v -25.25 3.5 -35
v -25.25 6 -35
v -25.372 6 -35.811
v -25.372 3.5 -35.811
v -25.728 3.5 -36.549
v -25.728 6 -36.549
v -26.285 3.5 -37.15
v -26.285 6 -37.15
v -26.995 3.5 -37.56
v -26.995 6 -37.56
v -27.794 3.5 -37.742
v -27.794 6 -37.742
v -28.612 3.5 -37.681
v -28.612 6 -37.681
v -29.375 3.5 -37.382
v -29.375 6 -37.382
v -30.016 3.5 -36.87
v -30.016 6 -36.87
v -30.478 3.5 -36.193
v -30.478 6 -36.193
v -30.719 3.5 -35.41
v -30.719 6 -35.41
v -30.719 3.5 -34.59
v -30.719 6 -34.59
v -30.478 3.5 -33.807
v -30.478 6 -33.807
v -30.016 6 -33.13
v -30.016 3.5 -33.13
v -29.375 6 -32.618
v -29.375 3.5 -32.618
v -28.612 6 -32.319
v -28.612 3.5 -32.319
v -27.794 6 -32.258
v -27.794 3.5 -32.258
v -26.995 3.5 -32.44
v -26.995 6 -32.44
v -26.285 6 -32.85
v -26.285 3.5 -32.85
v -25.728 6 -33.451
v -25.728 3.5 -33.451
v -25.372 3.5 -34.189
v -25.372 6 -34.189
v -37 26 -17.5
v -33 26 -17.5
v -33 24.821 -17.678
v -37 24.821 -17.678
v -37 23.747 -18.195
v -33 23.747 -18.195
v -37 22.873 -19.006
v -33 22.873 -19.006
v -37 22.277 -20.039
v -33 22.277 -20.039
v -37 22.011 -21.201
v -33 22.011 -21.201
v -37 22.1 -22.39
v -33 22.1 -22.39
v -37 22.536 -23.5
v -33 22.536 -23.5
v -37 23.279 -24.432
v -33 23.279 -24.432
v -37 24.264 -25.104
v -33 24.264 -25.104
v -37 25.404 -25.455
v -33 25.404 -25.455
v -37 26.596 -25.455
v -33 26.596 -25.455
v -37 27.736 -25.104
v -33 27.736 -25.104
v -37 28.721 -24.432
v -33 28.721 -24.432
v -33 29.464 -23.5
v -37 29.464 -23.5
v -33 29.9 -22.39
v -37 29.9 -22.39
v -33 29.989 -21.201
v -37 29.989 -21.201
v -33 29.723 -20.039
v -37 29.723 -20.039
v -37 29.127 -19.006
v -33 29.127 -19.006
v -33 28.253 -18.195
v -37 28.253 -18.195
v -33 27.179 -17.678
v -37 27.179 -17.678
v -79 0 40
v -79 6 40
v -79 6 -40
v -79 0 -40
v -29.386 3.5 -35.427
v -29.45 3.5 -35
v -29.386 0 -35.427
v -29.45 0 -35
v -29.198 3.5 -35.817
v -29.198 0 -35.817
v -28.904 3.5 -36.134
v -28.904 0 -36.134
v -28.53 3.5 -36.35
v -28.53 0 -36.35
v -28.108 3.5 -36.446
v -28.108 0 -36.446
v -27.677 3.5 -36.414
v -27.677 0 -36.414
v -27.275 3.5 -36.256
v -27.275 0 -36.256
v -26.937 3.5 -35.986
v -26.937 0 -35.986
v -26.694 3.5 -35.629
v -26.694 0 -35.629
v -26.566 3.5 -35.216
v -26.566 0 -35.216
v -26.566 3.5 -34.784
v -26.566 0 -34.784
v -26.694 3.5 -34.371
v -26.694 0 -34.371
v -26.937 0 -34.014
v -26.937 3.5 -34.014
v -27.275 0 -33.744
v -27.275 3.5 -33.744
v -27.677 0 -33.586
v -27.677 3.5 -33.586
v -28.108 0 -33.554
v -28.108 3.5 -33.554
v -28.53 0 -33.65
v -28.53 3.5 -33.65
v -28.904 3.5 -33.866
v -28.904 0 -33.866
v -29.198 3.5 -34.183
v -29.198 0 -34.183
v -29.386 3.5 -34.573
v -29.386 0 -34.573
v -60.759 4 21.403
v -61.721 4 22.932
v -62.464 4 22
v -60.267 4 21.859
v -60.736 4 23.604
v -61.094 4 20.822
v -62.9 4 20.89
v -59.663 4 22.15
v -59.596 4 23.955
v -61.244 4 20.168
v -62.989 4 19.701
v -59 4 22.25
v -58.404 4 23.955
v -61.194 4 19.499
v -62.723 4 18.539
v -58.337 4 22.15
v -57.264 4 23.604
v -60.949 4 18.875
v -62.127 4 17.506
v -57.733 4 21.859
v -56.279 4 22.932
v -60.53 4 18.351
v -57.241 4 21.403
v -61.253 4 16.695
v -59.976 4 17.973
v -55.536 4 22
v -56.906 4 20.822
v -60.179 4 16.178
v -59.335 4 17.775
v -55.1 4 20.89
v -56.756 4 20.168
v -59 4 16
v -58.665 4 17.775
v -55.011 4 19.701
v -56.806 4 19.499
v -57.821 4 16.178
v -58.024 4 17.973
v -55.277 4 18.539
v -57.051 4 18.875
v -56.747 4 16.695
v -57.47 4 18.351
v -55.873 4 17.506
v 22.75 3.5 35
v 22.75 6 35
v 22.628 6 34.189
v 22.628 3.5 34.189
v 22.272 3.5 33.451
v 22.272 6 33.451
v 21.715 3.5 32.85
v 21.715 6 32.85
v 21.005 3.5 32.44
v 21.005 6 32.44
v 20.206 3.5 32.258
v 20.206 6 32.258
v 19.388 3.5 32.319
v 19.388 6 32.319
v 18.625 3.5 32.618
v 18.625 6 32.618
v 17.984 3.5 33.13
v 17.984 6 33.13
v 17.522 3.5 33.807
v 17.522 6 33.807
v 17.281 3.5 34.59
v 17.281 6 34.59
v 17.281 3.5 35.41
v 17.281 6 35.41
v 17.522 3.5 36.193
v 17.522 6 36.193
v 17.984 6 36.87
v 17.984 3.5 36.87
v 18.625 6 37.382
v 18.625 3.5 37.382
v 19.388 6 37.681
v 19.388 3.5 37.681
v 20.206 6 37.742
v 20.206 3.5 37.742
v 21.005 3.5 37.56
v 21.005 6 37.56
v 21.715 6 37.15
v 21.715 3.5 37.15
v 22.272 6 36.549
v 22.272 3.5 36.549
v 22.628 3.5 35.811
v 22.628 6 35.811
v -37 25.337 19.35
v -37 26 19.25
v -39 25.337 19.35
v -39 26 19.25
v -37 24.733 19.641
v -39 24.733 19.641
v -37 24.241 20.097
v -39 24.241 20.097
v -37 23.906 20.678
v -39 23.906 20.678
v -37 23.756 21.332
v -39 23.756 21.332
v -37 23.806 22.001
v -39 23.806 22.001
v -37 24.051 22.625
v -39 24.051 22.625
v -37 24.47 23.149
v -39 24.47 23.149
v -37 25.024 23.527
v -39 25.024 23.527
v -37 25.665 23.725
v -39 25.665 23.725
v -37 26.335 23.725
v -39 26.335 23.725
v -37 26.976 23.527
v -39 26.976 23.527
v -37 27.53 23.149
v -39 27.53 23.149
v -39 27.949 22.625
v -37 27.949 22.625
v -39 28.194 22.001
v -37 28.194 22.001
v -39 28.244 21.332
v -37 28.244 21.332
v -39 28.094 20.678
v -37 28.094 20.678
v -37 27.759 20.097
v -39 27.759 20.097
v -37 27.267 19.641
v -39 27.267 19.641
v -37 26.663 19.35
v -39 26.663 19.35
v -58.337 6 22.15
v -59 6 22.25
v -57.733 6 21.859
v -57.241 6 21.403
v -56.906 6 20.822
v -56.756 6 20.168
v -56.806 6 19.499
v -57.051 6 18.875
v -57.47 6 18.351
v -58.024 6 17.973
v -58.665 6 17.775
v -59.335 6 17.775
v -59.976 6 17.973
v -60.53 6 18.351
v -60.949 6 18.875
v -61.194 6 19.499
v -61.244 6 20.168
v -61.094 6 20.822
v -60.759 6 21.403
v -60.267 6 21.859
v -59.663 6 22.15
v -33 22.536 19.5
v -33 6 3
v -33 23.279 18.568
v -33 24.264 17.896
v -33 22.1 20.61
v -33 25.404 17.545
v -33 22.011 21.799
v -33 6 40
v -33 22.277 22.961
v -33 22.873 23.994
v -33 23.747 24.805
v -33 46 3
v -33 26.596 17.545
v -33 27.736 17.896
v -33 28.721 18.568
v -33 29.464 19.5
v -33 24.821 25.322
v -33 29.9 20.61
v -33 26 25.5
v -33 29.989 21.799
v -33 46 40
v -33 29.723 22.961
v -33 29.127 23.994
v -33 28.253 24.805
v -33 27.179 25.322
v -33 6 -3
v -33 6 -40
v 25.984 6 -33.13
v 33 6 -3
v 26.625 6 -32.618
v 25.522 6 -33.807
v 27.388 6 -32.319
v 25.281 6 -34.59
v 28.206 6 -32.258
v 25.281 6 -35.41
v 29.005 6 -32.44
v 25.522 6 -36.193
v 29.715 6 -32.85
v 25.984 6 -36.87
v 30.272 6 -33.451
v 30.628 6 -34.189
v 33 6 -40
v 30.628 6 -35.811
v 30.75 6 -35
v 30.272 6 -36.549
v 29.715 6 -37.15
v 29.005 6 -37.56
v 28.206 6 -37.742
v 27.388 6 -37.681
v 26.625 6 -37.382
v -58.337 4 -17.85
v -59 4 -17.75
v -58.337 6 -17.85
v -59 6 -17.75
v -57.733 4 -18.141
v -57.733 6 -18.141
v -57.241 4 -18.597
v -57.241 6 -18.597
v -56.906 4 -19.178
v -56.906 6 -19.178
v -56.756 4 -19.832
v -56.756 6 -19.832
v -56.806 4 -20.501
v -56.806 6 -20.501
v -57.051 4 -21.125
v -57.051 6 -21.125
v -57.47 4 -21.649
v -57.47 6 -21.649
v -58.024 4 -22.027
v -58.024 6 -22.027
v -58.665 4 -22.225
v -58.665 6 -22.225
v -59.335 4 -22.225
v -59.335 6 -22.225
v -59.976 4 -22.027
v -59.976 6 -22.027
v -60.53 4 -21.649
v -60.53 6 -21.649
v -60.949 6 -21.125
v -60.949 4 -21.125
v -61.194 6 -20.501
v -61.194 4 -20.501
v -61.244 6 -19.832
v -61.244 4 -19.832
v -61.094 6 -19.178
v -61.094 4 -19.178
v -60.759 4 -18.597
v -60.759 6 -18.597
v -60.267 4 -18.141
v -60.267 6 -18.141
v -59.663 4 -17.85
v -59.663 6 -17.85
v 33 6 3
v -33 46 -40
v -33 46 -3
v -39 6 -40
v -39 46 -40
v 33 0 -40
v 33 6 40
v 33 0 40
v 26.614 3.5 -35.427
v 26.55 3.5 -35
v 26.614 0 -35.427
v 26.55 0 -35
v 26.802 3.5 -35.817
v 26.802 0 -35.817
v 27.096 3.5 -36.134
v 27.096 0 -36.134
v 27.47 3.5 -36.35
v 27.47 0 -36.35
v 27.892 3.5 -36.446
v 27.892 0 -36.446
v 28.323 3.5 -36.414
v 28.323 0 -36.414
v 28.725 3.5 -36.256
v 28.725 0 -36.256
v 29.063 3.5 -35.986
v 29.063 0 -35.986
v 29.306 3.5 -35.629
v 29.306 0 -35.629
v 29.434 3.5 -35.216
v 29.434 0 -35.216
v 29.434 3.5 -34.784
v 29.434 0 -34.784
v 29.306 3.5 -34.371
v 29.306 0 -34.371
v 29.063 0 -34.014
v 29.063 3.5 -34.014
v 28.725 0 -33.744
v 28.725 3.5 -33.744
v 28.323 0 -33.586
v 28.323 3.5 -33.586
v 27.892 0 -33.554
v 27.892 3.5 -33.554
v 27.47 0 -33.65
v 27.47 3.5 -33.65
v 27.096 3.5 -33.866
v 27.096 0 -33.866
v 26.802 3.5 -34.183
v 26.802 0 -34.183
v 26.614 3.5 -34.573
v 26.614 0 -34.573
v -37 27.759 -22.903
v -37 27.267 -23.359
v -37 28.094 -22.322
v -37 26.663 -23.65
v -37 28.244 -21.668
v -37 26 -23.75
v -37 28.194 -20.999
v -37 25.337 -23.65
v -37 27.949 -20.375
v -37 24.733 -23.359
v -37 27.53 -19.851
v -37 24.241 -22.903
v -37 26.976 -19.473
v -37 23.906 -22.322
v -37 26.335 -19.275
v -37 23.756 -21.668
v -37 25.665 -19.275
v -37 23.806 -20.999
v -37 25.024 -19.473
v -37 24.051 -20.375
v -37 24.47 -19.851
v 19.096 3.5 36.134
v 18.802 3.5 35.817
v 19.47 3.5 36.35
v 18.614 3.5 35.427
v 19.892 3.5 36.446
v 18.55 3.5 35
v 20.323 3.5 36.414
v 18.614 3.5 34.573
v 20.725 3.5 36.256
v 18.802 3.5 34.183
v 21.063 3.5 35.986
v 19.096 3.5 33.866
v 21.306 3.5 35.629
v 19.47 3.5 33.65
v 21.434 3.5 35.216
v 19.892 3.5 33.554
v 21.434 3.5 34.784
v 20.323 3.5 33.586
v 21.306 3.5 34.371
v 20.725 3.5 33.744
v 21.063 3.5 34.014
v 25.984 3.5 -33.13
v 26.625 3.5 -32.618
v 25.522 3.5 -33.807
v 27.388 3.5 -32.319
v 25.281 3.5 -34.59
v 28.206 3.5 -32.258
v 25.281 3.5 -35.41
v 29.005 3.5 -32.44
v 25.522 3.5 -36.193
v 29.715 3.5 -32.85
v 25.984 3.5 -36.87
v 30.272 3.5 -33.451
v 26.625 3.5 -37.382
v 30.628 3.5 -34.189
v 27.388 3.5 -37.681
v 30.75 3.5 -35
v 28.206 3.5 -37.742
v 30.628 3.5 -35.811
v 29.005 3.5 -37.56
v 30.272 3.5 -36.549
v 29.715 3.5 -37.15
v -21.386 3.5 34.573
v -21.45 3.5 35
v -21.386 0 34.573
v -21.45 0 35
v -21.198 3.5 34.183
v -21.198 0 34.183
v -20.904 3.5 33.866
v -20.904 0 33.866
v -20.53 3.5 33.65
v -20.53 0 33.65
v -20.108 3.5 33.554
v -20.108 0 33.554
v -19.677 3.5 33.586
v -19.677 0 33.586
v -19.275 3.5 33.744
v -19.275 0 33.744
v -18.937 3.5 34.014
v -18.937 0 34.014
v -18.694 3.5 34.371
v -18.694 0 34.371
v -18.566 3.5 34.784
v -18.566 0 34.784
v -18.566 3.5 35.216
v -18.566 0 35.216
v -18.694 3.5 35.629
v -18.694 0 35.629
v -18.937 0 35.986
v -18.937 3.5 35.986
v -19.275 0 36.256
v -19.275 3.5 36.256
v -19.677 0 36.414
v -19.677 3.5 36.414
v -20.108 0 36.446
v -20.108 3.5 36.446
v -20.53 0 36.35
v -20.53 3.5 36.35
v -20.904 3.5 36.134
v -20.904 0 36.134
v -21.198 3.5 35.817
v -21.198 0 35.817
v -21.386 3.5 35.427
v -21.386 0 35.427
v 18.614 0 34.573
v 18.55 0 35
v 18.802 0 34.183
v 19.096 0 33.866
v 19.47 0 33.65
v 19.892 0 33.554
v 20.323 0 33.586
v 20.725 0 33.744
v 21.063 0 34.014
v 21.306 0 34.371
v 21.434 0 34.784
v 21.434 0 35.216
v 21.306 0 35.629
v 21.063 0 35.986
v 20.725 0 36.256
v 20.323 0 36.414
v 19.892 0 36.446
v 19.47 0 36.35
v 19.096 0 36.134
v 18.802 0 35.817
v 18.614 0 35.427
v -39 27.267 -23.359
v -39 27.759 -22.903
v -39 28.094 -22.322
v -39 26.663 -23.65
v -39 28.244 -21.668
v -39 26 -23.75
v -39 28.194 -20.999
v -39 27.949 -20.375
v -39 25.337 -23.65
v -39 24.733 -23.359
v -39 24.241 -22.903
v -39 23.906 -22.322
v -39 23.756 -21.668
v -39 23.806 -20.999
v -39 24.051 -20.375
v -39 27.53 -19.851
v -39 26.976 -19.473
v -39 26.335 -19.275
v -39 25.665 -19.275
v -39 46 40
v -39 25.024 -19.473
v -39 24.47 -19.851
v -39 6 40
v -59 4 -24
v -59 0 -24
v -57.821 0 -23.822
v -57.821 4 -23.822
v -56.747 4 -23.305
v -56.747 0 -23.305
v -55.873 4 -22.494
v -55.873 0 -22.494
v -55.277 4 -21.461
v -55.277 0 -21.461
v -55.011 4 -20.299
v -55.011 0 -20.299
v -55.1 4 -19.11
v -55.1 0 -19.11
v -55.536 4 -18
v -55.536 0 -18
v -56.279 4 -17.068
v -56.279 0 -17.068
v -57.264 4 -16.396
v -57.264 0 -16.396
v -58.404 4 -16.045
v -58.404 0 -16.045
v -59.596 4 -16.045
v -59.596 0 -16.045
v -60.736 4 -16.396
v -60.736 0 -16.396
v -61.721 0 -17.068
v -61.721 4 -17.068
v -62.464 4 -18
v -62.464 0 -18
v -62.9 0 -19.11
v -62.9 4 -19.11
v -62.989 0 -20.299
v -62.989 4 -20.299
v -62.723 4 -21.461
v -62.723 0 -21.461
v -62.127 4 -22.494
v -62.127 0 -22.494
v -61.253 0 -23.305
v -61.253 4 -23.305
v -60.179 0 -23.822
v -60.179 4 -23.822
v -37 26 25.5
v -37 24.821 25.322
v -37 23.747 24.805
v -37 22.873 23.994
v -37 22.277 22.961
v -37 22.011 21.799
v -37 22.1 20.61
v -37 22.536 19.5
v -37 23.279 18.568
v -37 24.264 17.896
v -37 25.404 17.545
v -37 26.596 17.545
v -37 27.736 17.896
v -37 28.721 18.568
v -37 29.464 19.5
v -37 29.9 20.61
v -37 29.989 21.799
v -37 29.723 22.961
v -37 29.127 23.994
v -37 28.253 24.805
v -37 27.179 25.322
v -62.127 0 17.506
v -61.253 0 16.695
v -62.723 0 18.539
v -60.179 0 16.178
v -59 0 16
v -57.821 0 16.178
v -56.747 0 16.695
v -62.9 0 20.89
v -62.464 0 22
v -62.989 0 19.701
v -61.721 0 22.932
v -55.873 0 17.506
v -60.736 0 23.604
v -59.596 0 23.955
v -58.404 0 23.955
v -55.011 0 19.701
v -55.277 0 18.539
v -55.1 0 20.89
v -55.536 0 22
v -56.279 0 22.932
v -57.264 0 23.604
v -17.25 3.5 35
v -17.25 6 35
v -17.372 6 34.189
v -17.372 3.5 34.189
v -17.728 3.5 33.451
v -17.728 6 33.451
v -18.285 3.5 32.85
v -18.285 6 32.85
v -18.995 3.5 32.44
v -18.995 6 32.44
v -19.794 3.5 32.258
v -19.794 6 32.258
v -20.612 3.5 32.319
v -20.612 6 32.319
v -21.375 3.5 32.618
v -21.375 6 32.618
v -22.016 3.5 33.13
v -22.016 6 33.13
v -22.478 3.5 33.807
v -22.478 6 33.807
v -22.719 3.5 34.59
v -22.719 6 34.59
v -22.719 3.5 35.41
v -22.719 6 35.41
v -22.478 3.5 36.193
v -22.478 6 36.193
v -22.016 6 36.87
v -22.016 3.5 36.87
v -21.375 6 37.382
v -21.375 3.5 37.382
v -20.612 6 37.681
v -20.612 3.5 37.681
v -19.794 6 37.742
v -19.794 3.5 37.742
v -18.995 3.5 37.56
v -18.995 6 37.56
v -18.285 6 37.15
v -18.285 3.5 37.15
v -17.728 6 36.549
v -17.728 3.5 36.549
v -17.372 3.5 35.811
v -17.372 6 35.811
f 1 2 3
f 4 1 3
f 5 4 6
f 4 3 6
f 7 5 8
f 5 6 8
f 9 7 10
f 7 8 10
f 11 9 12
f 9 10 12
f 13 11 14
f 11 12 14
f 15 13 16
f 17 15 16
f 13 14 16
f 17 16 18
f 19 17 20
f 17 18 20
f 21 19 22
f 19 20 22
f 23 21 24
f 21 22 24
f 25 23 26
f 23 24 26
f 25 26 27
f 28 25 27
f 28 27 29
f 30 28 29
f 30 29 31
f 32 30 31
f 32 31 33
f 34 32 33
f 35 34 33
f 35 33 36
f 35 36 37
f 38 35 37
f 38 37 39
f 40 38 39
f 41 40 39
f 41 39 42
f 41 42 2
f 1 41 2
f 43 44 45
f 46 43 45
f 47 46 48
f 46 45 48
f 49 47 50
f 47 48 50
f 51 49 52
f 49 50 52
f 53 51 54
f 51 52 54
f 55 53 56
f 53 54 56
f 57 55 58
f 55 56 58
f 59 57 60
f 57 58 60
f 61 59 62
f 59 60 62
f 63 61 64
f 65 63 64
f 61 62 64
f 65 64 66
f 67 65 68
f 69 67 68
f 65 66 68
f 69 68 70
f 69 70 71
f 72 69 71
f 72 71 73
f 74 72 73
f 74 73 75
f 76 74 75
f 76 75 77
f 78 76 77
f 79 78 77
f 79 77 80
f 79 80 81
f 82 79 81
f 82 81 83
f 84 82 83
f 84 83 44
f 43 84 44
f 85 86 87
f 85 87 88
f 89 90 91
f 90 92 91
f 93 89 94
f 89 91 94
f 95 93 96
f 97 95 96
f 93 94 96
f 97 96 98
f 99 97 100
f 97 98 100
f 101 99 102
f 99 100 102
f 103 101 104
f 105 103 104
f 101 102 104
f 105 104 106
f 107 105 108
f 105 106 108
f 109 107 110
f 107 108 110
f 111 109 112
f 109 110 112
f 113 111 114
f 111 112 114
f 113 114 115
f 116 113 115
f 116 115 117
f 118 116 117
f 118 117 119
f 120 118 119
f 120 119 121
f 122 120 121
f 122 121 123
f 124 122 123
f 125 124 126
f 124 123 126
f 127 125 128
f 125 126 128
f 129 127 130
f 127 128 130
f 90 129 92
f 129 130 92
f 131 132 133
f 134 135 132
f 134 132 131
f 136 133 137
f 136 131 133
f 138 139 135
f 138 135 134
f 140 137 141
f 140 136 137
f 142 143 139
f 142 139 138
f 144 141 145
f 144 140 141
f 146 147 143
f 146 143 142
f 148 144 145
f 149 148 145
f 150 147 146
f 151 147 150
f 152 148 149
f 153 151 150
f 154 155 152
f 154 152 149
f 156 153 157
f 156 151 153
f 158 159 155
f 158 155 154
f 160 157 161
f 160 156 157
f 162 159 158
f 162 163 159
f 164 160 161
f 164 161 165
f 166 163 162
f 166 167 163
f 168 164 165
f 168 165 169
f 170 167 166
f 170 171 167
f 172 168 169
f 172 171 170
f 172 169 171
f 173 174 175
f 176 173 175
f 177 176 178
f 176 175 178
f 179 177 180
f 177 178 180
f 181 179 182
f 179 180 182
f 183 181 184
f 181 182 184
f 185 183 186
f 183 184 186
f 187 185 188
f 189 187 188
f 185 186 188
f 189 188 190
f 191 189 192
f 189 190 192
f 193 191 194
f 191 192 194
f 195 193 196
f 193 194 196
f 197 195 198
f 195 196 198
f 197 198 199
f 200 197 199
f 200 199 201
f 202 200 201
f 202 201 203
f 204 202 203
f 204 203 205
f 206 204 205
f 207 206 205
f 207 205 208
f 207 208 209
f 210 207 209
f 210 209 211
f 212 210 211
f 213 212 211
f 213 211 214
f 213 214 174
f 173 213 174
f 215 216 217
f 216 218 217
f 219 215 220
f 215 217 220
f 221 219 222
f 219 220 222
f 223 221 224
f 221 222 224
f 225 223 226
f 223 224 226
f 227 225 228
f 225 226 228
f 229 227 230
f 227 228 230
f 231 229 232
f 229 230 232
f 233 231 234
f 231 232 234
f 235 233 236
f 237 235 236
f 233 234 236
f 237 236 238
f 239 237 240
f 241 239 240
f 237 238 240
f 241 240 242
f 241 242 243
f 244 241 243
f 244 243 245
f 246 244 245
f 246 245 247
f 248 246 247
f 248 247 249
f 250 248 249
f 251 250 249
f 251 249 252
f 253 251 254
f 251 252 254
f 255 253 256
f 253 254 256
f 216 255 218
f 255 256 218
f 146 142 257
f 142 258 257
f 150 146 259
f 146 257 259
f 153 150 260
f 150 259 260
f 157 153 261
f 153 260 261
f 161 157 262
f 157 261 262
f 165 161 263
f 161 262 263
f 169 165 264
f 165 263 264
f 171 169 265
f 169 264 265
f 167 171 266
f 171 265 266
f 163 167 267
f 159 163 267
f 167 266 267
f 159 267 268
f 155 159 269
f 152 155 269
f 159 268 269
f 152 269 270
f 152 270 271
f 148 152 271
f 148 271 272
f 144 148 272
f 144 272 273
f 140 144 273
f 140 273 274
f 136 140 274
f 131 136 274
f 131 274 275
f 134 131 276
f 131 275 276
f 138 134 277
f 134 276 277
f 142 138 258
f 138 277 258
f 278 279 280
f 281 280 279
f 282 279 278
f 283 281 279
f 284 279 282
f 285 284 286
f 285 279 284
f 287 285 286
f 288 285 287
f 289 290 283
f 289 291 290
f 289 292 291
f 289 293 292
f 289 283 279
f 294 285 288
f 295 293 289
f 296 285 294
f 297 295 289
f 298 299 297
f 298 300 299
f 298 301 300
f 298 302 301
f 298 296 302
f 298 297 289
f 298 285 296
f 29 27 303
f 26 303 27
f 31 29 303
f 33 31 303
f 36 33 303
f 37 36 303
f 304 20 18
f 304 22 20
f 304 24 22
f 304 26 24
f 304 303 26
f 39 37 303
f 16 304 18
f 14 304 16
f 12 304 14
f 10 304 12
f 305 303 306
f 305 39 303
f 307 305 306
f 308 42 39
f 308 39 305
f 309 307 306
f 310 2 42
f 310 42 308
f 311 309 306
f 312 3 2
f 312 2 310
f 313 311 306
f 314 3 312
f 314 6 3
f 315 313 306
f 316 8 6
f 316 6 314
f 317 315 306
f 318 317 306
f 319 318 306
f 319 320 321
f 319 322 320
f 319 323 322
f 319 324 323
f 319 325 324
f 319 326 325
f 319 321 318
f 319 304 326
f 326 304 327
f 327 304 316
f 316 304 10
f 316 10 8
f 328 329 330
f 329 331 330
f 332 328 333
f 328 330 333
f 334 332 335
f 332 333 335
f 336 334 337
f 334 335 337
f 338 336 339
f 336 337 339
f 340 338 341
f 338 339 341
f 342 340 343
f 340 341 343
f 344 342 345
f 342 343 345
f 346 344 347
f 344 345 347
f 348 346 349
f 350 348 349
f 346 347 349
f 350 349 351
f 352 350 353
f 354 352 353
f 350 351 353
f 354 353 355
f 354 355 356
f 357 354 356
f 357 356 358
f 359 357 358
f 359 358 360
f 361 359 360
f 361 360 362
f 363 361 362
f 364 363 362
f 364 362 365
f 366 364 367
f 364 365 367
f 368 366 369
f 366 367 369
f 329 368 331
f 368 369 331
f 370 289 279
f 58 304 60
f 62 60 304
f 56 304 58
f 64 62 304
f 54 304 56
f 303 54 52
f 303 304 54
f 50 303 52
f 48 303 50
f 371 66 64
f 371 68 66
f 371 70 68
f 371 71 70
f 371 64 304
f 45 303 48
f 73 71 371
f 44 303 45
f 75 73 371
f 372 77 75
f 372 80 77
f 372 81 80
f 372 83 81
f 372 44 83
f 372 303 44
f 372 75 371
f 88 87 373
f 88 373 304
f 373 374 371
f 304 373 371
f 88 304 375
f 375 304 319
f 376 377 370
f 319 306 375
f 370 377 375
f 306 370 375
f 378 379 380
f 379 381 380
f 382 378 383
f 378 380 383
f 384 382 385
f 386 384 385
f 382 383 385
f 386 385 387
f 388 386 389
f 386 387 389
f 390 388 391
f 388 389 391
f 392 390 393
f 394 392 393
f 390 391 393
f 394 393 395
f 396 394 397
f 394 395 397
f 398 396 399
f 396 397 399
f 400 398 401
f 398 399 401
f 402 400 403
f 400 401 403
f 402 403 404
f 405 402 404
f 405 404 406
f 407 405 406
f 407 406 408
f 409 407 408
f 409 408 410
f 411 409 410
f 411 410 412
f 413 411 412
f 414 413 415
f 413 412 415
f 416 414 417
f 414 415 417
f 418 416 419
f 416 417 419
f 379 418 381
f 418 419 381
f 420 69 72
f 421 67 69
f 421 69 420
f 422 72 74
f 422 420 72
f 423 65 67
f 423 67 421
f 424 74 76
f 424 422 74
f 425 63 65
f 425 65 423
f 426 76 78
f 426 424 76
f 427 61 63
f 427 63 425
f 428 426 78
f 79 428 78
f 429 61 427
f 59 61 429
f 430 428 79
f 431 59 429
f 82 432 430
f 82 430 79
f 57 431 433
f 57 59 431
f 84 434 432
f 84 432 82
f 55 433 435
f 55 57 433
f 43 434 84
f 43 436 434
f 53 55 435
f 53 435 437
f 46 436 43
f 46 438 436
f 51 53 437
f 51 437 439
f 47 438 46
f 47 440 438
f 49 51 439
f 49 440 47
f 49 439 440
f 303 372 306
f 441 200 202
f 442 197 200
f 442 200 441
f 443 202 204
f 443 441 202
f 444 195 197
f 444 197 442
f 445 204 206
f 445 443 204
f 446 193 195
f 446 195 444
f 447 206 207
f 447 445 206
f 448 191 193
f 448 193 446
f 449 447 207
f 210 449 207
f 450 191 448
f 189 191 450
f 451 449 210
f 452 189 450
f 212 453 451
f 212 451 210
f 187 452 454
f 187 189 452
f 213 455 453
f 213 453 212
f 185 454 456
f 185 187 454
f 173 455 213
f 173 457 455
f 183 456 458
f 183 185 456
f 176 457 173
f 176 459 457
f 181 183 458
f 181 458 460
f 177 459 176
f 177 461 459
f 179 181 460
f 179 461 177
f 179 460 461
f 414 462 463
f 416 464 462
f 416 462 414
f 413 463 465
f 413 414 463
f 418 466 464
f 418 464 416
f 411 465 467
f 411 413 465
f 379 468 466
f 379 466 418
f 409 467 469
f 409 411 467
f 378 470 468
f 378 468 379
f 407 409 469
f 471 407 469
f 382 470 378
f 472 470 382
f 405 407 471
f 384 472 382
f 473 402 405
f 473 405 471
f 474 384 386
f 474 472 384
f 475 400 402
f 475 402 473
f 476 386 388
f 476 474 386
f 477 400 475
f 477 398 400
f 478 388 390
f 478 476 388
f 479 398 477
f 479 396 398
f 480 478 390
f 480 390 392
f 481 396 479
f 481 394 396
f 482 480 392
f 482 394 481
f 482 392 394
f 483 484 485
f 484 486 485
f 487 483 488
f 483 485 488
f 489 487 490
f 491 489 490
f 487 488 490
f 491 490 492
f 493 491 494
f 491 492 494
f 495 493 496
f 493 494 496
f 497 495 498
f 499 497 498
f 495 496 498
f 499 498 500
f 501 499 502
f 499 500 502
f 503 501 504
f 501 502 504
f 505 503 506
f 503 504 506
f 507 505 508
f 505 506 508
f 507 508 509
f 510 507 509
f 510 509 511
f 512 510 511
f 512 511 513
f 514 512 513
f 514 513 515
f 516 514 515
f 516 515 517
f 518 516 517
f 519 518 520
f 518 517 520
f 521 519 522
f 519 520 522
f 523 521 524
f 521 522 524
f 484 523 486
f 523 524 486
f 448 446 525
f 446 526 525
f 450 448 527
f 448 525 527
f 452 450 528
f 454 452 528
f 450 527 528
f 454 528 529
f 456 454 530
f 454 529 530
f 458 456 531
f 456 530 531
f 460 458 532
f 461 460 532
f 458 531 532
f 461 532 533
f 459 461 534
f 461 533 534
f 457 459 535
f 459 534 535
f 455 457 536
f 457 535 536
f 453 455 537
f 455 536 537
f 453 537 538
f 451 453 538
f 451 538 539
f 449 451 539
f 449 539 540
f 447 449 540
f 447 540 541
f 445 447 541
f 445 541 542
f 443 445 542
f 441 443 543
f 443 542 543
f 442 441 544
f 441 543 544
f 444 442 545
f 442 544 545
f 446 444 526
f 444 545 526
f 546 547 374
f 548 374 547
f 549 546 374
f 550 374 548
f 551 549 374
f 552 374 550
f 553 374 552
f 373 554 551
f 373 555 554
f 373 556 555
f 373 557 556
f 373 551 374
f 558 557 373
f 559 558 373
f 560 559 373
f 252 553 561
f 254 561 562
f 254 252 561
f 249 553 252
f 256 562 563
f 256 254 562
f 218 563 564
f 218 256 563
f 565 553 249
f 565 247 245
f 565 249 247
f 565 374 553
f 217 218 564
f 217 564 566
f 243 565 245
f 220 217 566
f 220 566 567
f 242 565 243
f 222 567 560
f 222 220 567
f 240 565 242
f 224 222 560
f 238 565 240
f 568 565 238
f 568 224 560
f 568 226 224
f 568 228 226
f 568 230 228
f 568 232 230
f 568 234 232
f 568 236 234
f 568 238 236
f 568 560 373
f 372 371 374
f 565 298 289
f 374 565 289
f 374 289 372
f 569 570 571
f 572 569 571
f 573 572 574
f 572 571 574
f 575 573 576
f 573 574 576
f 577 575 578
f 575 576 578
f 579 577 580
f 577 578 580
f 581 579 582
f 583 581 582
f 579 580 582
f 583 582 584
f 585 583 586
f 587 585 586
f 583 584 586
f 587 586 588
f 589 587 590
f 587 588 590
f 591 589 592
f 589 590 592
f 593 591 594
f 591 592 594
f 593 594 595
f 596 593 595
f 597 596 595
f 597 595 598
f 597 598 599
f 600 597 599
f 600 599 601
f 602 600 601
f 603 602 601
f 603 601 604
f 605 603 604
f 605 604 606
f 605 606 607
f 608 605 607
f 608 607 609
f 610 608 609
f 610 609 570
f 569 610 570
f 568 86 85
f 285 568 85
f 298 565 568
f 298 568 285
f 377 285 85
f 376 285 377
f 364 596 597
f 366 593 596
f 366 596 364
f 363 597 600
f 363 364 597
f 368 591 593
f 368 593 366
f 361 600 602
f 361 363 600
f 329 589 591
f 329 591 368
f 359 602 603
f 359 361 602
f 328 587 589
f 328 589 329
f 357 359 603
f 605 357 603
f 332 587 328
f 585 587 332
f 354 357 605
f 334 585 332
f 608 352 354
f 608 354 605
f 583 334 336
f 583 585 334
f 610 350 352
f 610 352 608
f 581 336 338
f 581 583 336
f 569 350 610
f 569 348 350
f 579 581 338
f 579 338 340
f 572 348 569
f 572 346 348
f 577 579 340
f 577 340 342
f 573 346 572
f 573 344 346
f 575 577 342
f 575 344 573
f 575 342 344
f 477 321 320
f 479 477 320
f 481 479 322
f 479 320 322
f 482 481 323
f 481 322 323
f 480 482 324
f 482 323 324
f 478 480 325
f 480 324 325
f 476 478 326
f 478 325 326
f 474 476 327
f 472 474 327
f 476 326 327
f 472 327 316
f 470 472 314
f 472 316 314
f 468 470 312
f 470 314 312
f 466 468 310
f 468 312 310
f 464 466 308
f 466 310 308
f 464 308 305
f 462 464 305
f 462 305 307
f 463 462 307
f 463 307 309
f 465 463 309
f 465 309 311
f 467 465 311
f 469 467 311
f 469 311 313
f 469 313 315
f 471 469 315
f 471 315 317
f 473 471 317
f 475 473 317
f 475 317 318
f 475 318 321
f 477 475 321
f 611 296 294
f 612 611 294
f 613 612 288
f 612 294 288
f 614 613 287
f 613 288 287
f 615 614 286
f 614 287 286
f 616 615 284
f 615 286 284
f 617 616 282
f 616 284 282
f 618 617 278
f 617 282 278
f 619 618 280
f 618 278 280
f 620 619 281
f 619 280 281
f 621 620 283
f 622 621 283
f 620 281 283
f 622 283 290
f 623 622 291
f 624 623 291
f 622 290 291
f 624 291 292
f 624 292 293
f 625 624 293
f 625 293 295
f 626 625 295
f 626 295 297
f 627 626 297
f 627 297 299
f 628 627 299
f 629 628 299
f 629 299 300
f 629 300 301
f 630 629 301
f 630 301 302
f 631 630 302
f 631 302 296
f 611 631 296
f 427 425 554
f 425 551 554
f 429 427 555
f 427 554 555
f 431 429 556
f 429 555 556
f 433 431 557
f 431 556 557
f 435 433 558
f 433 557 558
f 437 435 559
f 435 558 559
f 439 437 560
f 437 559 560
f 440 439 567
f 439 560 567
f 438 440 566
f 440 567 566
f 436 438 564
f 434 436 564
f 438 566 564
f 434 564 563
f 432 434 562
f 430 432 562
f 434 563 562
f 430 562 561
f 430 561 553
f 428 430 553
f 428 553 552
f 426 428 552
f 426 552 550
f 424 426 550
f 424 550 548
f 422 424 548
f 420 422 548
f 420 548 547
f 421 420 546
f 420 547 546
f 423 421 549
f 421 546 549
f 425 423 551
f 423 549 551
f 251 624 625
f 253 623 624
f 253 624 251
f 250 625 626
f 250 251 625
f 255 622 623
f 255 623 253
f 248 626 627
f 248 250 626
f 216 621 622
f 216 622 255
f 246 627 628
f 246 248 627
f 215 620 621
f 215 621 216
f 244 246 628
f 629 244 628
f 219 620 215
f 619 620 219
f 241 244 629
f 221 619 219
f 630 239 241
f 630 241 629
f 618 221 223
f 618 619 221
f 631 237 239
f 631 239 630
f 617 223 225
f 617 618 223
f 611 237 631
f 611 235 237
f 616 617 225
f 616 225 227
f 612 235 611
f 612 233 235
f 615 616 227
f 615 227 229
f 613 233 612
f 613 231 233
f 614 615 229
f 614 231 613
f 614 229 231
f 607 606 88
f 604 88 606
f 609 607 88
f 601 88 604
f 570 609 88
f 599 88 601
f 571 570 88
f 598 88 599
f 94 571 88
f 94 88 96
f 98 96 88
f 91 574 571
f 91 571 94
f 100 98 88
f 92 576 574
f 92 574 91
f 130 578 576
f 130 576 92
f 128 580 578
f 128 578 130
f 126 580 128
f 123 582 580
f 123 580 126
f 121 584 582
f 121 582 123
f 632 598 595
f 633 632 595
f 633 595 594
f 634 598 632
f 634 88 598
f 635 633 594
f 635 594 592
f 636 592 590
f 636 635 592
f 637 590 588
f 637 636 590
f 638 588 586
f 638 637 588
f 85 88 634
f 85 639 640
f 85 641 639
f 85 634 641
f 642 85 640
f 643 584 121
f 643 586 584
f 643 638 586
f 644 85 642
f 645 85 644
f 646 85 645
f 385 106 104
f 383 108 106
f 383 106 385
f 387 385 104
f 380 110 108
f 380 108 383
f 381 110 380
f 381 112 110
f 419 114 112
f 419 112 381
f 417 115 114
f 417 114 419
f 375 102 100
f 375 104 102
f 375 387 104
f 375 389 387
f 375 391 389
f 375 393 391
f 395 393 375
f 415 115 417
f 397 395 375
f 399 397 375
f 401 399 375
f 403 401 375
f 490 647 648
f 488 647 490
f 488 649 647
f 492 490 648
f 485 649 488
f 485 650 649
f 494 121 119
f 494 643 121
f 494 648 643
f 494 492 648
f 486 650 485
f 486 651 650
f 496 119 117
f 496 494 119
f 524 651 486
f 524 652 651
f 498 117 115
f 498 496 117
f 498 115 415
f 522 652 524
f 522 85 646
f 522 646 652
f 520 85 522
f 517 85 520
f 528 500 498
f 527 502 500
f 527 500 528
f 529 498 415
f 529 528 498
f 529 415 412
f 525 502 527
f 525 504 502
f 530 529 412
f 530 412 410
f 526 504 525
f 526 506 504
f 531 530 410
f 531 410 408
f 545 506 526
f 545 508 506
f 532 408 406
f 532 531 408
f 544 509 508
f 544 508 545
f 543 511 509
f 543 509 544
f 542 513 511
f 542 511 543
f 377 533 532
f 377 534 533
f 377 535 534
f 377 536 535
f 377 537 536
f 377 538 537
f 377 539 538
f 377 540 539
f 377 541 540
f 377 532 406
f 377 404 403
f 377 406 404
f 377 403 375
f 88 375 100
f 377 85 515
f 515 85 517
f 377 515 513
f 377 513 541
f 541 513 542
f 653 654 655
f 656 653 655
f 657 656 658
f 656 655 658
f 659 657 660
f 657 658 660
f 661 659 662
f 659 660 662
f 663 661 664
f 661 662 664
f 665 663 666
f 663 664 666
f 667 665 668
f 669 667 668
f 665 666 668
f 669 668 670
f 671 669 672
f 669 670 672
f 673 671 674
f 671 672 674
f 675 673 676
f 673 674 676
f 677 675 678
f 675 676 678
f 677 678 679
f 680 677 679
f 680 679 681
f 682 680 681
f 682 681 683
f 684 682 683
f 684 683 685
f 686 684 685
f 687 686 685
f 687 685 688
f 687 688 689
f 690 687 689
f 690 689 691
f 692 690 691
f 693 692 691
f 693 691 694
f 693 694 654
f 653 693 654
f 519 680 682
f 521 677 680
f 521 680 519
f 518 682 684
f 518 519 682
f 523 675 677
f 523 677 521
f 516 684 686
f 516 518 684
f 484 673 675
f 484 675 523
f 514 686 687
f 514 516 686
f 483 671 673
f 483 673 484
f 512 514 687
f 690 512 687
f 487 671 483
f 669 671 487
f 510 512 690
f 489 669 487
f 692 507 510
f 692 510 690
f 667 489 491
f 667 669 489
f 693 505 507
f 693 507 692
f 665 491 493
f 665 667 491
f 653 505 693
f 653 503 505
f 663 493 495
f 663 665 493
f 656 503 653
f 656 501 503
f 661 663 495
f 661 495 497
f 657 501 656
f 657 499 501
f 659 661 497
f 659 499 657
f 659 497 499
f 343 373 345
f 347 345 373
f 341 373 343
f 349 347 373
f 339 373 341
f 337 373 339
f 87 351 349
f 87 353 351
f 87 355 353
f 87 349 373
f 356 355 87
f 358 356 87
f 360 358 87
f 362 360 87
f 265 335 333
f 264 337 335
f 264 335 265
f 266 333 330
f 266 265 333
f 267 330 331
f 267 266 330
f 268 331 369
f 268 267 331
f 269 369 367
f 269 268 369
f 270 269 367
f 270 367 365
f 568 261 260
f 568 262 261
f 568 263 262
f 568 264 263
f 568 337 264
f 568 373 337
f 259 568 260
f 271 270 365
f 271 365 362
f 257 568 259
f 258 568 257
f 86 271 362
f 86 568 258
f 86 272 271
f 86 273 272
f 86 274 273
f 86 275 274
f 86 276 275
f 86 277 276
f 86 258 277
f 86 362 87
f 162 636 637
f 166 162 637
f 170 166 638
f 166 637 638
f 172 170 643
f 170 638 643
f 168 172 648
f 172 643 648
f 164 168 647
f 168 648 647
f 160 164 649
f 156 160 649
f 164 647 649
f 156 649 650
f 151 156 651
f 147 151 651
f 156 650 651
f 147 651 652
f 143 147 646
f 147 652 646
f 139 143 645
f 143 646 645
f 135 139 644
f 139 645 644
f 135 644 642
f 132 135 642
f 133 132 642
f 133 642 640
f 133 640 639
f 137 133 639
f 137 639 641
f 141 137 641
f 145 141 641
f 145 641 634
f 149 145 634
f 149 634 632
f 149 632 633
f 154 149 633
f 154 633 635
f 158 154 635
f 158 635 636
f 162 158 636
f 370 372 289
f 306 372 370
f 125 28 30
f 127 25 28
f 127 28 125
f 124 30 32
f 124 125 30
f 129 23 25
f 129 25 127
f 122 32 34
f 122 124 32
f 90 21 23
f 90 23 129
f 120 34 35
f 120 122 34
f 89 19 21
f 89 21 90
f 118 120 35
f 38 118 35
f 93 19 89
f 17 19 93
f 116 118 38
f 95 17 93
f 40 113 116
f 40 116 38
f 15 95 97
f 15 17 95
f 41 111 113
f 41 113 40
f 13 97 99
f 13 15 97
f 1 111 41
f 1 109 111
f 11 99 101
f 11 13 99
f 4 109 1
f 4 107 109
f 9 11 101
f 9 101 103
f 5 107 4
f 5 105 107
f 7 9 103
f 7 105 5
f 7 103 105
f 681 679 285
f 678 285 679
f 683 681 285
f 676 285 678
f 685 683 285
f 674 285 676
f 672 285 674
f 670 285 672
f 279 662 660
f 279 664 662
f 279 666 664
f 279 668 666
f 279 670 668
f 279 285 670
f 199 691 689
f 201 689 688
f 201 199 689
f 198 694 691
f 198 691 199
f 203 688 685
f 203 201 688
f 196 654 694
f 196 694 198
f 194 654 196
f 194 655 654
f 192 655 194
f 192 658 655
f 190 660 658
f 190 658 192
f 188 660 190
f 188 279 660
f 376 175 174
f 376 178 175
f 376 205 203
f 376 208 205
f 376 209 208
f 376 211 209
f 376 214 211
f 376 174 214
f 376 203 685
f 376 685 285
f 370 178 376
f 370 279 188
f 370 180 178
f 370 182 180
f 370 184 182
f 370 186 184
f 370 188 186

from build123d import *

# Parameters (mm, degrees)
SKETCH1_W                                = 66
SKETCH1_H                                = 80
BOSS_EXTRUDE1_DEPTH                      = 6
CBORE_FOR_M2_5_SHCS2_D                   = 2.9
CBORE_FOR_M2_5_SHCS2_CBORE_D             = 5.5
CBORE_FOR_M2_5_SHCS2_CBORE_DEPTH         = 2.5
BOSS_EXTRUDE2_DEPTH                      = 80
RIB1_REACH                               = 101.785
SKETCH5_WALL_W                           = 278.74466228
SKETCH5_WALL_H                           = 6
CBORE_FOR_M4_SHCS1_D                     = 4.5
CBORE_FOR_M4_SHCS1_CBORE_D               = 8
CBORE_FOR_M4_SHCS1_CBORE_DEPTH           = 4
CBORE_FOR_M4_SHCS1_ON_FACE_2_D           = 4.5
CBORE_FOR_M4_SHCS1_ON_FACE_2_CBORE_D     = 8
CBORE_FOR_M4_SHCS1_ON_FACE_2_CBORE_DEPTH = 4


with BuildPart() as part:
    # Sketch1 → Boss-Extrude1 (new body)
    with BuildSketch(Plane(origin=(0, 0, 0), x_dir=(1, 0, 0), z_dir=(0, 1, 0))):
        Rectangle(SKETCH1_W, SKETCH1_H)
    extrude(amount=BOSS_EXTRUDE1_DEPTH)

    # CBORE for M2.5 SHCS2 (through all)
    with Locations(Plane(origin=(0, 6, 0), x_dir=(1, 0, 0), z_dir=(0, 1, 0))):
        with Locations((20, -35), (-28, 35), (28, 35), (-20, -35)):
            CounterBoreHole(CBORE_FOR_M2_5_SHCS2_D / 2, CBORE_FOR_M2_5_SHCS2_CBORE_D / 2, CBORE_FOR_M2_5_SHCS2_CBORE_DEPTH)

    # Sketch4 → Boss-Extrude2 (add)
    with BuildSketch(Plane.XY.offset(40)):
        Polygon((-33, 0), (-33, 46), (-39, 46), (-39, 6), (-79, 6), (-79, 0), align=None)
    extrude(amount=-BOSS_EXTRUDE2_DEPTH)

    # Sketch5 wall → Rib1 (add, up to next)
    with BuildSketch(Plane(origin=(0, 26, 0), x_dir=(0.855197831554, -0.518301716093, 0), z_dir=(0.518301716093, 0.855197831554, 0)), mode=Mode.PRIVATE) as rib1_sk1:
        Rectangle(SKETCH5_WALL_W, SKETCH5_WALL_H)
    rib1_tool1 = extrude(rib1_sk1.sketch, amount=-RIB1_REACH, mode=Mode.PRIVATE) - part.part
    add(rib1_tool1.solids().sort_by_distance((0, 26, 0))[0])

    # CBORE for M4 SHCS1 (through all)
    with Locations(Plane(origin=(-59, 0, -20), x_dir=(0, 0, -1), z_dir=(0, -1, 0))):
        with Locations((0, 0), (-40, 0)):
            CounterBoreHole(CBORE_FOR_M4_SHCS1_D / 2, CBORE_FOR_M4_SHCS1_CBORE_D / 2, CBORE_FOR_M4_SHCS1_CBORE_DEPTH)

    # CBORE for M4 SHCS1 on face 2 (through all)
    with Locations(Plane(origin=(-33, 26, -21.5), x_dir=(0, 0, 1), z_dir=(1, 0, 0))):
        with Locations((0, 0), (43, 0)):
            CounterBoreHole(CBORE_FOR_M4_SHCS1_ON_FACE_2_D / 2, CBORE_FOR_M4_SHCS1_ON_FACE_2_CBORE_D / 2, CBORE_FOR_M4_SHCS1_ON_FACE_2_CBORE_DEPTH)


solid = part.part
